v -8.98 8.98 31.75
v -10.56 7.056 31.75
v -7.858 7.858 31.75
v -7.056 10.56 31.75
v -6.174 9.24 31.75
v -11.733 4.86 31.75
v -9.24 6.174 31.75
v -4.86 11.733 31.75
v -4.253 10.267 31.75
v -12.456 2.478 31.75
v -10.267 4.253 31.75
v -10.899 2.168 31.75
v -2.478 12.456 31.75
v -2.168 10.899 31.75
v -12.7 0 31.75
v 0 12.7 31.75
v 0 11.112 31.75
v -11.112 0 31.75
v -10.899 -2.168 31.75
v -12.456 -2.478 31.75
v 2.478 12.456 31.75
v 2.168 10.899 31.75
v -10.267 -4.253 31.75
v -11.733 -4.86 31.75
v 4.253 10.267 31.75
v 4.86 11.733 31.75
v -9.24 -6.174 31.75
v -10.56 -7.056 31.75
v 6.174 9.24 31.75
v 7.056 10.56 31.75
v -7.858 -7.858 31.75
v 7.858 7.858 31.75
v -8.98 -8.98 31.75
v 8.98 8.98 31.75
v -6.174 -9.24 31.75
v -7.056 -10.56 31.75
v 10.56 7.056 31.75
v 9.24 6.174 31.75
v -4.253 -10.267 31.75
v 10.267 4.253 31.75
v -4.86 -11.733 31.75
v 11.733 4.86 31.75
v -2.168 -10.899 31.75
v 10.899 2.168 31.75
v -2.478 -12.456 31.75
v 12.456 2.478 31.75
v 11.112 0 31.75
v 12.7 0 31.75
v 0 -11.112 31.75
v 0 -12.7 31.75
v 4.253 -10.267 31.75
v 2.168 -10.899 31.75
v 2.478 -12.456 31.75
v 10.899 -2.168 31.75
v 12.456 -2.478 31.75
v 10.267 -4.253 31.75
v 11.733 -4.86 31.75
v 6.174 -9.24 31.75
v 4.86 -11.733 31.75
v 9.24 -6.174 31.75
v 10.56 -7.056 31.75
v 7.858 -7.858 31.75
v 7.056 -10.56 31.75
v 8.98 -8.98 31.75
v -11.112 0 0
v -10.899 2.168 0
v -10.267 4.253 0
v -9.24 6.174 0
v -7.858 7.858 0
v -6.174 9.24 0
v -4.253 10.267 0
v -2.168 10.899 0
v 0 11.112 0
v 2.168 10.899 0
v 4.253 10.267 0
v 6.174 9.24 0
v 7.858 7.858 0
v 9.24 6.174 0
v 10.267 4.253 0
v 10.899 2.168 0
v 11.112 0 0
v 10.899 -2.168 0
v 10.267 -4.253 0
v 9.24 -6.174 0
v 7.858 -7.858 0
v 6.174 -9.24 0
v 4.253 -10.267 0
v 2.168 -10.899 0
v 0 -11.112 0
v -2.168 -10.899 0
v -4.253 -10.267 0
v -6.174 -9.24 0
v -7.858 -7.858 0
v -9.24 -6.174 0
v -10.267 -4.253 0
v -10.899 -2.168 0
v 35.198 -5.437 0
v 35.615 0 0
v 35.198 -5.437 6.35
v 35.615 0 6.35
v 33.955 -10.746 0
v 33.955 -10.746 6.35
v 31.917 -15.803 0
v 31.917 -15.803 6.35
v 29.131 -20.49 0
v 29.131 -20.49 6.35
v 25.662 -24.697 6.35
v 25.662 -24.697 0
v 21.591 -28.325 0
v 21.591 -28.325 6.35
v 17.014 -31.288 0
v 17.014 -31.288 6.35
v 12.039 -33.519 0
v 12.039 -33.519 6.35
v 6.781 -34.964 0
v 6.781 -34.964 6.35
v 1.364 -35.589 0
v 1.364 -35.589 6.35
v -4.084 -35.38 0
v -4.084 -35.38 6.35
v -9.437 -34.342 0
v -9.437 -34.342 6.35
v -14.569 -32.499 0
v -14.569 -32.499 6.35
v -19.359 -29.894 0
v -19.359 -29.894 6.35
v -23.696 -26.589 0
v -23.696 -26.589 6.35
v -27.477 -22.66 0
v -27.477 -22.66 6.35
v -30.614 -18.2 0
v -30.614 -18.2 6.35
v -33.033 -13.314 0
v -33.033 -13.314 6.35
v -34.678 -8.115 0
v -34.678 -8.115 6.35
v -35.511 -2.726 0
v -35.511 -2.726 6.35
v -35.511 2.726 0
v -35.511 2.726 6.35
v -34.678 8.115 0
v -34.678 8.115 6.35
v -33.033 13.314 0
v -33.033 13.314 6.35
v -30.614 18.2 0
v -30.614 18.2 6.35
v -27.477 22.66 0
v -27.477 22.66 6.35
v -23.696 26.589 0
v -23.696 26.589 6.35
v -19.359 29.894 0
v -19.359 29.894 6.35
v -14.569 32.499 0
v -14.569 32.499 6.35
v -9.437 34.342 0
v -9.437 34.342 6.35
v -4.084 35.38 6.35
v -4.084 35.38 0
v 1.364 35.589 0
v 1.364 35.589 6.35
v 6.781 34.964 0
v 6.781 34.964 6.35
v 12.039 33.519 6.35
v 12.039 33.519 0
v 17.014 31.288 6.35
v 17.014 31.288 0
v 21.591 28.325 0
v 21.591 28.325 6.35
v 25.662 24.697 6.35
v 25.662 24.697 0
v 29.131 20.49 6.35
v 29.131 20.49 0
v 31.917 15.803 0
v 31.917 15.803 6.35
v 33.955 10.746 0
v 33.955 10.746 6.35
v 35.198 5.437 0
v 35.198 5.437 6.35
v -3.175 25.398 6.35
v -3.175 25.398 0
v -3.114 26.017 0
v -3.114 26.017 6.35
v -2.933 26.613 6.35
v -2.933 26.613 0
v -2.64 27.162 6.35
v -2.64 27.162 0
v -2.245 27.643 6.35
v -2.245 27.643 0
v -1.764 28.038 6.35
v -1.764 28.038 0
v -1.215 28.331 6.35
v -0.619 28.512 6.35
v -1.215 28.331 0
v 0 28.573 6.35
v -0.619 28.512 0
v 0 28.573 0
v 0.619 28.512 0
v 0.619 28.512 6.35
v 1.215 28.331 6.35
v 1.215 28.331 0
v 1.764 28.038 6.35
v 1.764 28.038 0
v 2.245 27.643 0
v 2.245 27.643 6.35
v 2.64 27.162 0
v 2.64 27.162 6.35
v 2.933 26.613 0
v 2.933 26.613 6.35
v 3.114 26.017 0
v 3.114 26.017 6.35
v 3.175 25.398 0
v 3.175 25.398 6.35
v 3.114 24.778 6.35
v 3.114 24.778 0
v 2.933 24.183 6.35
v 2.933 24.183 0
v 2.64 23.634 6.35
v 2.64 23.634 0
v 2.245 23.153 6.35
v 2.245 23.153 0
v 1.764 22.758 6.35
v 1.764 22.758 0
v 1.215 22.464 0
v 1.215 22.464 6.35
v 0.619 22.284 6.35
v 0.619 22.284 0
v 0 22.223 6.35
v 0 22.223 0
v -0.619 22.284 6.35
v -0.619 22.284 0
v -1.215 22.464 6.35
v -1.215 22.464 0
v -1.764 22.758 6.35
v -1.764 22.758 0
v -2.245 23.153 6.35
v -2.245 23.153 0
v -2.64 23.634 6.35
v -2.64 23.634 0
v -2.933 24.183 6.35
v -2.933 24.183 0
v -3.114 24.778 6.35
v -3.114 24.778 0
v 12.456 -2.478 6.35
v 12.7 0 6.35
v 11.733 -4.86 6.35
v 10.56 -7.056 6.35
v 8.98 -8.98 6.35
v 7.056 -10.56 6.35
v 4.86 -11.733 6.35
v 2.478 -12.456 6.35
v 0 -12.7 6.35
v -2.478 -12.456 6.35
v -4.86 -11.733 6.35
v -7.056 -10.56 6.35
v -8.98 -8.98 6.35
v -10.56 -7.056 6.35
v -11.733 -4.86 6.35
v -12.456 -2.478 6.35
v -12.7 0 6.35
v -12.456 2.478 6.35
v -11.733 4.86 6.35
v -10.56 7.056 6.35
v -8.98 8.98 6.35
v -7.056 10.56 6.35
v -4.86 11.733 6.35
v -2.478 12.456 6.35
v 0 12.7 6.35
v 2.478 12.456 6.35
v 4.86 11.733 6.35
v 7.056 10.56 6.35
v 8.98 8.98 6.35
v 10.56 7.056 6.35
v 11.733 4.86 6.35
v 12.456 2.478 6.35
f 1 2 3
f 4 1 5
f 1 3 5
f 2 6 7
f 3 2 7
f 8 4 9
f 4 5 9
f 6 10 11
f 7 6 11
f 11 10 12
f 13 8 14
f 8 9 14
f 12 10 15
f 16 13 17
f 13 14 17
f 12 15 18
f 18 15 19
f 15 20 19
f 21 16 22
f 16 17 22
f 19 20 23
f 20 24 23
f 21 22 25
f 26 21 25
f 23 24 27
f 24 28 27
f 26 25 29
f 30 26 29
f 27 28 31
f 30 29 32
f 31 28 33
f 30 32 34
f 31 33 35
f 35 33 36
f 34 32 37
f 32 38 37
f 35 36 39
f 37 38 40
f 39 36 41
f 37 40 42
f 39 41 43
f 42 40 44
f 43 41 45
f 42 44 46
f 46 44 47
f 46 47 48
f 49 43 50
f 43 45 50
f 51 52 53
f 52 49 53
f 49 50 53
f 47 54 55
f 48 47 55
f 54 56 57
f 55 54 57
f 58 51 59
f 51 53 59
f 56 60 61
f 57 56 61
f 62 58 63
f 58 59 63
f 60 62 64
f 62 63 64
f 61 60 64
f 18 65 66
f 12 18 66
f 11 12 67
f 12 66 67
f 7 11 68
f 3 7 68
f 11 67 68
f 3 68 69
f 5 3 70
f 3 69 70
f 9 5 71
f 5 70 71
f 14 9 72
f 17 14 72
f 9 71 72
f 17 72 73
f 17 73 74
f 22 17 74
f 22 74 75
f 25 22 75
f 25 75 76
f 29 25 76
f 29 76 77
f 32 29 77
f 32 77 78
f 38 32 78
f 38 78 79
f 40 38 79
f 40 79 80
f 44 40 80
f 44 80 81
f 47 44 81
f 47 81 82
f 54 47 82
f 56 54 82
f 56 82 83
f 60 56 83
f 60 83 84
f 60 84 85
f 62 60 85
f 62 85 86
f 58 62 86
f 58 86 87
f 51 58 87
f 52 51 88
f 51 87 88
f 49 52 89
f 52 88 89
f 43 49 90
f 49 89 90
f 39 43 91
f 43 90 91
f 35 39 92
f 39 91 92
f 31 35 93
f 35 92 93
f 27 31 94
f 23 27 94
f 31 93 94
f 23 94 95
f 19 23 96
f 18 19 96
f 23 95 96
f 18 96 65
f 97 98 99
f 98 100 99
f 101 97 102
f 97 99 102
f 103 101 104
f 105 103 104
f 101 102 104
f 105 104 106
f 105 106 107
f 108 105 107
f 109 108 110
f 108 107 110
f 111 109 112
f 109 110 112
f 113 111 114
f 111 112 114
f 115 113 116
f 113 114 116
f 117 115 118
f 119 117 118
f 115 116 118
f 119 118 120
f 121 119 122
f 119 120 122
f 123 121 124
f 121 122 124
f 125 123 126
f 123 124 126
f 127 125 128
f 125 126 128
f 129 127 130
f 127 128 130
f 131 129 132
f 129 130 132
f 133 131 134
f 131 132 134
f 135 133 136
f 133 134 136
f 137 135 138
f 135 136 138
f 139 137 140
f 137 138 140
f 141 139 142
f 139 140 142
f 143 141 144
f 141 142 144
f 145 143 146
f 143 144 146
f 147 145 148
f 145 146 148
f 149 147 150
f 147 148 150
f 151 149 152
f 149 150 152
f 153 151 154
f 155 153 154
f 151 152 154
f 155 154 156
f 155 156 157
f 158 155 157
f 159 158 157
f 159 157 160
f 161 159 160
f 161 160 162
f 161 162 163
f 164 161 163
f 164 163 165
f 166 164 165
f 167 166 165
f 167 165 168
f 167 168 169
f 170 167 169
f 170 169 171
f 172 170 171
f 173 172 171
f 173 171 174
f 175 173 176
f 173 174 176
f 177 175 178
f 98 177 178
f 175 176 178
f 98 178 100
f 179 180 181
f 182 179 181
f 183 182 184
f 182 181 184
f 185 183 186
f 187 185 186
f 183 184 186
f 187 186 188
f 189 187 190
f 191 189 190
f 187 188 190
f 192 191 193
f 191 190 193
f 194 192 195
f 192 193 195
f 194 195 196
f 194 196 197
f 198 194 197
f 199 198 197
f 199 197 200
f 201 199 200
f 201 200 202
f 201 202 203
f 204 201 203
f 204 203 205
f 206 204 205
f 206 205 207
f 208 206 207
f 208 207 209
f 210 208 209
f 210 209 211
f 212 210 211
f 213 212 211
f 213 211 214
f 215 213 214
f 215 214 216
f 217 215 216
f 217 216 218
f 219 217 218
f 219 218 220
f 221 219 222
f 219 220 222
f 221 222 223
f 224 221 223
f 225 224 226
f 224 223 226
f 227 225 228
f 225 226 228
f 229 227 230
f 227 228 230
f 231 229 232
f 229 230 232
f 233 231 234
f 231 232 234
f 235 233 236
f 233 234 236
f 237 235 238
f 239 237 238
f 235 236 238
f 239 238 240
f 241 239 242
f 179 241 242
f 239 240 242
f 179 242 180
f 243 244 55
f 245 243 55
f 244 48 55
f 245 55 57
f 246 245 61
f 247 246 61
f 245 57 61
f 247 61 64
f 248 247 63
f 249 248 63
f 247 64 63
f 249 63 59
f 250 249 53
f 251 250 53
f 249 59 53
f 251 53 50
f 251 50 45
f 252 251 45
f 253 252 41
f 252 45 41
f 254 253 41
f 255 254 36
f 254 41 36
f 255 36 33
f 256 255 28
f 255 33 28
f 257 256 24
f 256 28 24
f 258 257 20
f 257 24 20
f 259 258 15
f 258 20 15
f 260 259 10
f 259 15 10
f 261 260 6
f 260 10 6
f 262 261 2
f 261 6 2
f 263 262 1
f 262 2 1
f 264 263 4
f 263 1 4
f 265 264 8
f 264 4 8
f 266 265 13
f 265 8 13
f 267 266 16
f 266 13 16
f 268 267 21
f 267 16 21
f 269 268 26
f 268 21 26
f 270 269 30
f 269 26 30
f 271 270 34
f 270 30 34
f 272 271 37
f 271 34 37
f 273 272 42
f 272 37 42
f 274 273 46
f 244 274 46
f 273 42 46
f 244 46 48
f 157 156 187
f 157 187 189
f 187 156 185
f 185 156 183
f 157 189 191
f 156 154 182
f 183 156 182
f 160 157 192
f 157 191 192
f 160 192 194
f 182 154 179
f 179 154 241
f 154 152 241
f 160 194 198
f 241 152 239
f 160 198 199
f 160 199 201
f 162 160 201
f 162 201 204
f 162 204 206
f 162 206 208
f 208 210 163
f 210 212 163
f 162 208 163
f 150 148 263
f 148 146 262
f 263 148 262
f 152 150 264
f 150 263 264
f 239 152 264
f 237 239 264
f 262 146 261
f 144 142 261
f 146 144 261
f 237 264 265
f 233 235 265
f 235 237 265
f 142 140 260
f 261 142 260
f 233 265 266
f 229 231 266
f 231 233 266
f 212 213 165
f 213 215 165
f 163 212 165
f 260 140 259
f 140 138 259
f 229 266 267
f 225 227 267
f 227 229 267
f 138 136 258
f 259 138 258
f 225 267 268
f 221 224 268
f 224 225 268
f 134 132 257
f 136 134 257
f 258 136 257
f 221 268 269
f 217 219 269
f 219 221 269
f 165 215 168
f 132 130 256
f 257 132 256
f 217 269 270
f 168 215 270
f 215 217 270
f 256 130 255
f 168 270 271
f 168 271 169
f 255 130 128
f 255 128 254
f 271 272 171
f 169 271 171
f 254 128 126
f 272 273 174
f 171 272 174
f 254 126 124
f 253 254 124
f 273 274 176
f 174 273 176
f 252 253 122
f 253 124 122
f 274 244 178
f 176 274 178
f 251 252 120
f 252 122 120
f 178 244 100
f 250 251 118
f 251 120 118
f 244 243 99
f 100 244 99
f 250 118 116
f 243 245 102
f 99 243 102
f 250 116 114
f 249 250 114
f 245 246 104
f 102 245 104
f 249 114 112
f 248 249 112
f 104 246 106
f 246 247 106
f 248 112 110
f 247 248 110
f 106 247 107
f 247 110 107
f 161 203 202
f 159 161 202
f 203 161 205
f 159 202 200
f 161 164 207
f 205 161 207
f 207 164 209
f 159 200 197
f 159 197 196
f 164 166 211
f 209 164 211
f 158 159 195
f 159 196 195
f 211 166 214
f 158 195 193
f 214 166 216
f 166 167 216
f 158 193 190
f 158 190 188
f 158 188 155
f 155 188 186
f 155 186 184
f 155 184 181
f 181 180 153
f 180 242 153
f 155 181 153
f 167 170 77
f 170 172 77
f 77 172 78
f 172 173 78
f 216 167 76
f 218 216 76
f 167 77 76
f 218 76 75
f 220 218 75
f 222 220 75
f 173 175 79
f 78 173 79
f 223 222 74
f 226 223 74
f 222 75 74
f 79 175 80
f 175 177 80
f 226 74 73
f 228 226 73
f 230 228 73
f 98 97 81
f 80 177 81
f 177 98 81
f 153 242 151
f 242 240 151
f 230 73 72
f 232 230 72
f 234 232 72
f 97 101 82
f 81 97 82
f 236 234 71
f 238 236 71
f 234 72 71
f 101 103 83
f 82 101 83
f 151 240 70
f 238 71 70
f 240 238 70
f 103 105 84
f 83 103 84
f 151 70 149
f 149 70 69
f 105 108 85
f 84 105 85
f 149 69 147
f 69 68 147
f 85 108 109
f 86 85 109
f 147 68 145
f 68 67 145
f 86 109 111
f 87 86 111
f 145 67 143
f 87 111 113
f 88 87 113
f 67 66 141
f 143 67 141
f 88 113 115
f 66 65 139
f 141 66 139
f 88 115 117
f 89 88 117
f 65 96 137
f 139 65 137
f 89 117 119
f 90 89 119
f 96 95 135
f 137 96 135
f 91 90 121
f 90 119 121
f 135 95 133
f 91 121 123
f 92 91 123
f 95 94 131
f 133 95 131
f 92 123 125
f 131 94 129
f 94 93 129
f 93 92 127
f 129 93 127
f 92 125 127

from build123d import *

# Parameters (mm, degrees)
F3_D = 22.225
F5_D = 6.35


with BuildPart() as f1:
    # F0 (on Front) → F1 (revolve)
    with BuildSketch(Plane.XZ):
        Polygon((0, 31.75), (0, 0), (35.615216, 0), (35.615216, 6.35), (12.7, 6.35), (12.7, 31.75), align=None)
    revolve(axis=Axis((0, 0, 15.875), (0, 0, -1)))

    # F3 (through all)
    with Locations(Plane.XY.offset(31.75)):
        with Locations((0, 0)):
            Hole(F3_D / 2)

    # F5 (through all)
    with Locations(Plane.XY.offset(6.35)):
        with Locations((0, 25.39767)):
            Hole(F5_D / 2)


solid = f1.part
